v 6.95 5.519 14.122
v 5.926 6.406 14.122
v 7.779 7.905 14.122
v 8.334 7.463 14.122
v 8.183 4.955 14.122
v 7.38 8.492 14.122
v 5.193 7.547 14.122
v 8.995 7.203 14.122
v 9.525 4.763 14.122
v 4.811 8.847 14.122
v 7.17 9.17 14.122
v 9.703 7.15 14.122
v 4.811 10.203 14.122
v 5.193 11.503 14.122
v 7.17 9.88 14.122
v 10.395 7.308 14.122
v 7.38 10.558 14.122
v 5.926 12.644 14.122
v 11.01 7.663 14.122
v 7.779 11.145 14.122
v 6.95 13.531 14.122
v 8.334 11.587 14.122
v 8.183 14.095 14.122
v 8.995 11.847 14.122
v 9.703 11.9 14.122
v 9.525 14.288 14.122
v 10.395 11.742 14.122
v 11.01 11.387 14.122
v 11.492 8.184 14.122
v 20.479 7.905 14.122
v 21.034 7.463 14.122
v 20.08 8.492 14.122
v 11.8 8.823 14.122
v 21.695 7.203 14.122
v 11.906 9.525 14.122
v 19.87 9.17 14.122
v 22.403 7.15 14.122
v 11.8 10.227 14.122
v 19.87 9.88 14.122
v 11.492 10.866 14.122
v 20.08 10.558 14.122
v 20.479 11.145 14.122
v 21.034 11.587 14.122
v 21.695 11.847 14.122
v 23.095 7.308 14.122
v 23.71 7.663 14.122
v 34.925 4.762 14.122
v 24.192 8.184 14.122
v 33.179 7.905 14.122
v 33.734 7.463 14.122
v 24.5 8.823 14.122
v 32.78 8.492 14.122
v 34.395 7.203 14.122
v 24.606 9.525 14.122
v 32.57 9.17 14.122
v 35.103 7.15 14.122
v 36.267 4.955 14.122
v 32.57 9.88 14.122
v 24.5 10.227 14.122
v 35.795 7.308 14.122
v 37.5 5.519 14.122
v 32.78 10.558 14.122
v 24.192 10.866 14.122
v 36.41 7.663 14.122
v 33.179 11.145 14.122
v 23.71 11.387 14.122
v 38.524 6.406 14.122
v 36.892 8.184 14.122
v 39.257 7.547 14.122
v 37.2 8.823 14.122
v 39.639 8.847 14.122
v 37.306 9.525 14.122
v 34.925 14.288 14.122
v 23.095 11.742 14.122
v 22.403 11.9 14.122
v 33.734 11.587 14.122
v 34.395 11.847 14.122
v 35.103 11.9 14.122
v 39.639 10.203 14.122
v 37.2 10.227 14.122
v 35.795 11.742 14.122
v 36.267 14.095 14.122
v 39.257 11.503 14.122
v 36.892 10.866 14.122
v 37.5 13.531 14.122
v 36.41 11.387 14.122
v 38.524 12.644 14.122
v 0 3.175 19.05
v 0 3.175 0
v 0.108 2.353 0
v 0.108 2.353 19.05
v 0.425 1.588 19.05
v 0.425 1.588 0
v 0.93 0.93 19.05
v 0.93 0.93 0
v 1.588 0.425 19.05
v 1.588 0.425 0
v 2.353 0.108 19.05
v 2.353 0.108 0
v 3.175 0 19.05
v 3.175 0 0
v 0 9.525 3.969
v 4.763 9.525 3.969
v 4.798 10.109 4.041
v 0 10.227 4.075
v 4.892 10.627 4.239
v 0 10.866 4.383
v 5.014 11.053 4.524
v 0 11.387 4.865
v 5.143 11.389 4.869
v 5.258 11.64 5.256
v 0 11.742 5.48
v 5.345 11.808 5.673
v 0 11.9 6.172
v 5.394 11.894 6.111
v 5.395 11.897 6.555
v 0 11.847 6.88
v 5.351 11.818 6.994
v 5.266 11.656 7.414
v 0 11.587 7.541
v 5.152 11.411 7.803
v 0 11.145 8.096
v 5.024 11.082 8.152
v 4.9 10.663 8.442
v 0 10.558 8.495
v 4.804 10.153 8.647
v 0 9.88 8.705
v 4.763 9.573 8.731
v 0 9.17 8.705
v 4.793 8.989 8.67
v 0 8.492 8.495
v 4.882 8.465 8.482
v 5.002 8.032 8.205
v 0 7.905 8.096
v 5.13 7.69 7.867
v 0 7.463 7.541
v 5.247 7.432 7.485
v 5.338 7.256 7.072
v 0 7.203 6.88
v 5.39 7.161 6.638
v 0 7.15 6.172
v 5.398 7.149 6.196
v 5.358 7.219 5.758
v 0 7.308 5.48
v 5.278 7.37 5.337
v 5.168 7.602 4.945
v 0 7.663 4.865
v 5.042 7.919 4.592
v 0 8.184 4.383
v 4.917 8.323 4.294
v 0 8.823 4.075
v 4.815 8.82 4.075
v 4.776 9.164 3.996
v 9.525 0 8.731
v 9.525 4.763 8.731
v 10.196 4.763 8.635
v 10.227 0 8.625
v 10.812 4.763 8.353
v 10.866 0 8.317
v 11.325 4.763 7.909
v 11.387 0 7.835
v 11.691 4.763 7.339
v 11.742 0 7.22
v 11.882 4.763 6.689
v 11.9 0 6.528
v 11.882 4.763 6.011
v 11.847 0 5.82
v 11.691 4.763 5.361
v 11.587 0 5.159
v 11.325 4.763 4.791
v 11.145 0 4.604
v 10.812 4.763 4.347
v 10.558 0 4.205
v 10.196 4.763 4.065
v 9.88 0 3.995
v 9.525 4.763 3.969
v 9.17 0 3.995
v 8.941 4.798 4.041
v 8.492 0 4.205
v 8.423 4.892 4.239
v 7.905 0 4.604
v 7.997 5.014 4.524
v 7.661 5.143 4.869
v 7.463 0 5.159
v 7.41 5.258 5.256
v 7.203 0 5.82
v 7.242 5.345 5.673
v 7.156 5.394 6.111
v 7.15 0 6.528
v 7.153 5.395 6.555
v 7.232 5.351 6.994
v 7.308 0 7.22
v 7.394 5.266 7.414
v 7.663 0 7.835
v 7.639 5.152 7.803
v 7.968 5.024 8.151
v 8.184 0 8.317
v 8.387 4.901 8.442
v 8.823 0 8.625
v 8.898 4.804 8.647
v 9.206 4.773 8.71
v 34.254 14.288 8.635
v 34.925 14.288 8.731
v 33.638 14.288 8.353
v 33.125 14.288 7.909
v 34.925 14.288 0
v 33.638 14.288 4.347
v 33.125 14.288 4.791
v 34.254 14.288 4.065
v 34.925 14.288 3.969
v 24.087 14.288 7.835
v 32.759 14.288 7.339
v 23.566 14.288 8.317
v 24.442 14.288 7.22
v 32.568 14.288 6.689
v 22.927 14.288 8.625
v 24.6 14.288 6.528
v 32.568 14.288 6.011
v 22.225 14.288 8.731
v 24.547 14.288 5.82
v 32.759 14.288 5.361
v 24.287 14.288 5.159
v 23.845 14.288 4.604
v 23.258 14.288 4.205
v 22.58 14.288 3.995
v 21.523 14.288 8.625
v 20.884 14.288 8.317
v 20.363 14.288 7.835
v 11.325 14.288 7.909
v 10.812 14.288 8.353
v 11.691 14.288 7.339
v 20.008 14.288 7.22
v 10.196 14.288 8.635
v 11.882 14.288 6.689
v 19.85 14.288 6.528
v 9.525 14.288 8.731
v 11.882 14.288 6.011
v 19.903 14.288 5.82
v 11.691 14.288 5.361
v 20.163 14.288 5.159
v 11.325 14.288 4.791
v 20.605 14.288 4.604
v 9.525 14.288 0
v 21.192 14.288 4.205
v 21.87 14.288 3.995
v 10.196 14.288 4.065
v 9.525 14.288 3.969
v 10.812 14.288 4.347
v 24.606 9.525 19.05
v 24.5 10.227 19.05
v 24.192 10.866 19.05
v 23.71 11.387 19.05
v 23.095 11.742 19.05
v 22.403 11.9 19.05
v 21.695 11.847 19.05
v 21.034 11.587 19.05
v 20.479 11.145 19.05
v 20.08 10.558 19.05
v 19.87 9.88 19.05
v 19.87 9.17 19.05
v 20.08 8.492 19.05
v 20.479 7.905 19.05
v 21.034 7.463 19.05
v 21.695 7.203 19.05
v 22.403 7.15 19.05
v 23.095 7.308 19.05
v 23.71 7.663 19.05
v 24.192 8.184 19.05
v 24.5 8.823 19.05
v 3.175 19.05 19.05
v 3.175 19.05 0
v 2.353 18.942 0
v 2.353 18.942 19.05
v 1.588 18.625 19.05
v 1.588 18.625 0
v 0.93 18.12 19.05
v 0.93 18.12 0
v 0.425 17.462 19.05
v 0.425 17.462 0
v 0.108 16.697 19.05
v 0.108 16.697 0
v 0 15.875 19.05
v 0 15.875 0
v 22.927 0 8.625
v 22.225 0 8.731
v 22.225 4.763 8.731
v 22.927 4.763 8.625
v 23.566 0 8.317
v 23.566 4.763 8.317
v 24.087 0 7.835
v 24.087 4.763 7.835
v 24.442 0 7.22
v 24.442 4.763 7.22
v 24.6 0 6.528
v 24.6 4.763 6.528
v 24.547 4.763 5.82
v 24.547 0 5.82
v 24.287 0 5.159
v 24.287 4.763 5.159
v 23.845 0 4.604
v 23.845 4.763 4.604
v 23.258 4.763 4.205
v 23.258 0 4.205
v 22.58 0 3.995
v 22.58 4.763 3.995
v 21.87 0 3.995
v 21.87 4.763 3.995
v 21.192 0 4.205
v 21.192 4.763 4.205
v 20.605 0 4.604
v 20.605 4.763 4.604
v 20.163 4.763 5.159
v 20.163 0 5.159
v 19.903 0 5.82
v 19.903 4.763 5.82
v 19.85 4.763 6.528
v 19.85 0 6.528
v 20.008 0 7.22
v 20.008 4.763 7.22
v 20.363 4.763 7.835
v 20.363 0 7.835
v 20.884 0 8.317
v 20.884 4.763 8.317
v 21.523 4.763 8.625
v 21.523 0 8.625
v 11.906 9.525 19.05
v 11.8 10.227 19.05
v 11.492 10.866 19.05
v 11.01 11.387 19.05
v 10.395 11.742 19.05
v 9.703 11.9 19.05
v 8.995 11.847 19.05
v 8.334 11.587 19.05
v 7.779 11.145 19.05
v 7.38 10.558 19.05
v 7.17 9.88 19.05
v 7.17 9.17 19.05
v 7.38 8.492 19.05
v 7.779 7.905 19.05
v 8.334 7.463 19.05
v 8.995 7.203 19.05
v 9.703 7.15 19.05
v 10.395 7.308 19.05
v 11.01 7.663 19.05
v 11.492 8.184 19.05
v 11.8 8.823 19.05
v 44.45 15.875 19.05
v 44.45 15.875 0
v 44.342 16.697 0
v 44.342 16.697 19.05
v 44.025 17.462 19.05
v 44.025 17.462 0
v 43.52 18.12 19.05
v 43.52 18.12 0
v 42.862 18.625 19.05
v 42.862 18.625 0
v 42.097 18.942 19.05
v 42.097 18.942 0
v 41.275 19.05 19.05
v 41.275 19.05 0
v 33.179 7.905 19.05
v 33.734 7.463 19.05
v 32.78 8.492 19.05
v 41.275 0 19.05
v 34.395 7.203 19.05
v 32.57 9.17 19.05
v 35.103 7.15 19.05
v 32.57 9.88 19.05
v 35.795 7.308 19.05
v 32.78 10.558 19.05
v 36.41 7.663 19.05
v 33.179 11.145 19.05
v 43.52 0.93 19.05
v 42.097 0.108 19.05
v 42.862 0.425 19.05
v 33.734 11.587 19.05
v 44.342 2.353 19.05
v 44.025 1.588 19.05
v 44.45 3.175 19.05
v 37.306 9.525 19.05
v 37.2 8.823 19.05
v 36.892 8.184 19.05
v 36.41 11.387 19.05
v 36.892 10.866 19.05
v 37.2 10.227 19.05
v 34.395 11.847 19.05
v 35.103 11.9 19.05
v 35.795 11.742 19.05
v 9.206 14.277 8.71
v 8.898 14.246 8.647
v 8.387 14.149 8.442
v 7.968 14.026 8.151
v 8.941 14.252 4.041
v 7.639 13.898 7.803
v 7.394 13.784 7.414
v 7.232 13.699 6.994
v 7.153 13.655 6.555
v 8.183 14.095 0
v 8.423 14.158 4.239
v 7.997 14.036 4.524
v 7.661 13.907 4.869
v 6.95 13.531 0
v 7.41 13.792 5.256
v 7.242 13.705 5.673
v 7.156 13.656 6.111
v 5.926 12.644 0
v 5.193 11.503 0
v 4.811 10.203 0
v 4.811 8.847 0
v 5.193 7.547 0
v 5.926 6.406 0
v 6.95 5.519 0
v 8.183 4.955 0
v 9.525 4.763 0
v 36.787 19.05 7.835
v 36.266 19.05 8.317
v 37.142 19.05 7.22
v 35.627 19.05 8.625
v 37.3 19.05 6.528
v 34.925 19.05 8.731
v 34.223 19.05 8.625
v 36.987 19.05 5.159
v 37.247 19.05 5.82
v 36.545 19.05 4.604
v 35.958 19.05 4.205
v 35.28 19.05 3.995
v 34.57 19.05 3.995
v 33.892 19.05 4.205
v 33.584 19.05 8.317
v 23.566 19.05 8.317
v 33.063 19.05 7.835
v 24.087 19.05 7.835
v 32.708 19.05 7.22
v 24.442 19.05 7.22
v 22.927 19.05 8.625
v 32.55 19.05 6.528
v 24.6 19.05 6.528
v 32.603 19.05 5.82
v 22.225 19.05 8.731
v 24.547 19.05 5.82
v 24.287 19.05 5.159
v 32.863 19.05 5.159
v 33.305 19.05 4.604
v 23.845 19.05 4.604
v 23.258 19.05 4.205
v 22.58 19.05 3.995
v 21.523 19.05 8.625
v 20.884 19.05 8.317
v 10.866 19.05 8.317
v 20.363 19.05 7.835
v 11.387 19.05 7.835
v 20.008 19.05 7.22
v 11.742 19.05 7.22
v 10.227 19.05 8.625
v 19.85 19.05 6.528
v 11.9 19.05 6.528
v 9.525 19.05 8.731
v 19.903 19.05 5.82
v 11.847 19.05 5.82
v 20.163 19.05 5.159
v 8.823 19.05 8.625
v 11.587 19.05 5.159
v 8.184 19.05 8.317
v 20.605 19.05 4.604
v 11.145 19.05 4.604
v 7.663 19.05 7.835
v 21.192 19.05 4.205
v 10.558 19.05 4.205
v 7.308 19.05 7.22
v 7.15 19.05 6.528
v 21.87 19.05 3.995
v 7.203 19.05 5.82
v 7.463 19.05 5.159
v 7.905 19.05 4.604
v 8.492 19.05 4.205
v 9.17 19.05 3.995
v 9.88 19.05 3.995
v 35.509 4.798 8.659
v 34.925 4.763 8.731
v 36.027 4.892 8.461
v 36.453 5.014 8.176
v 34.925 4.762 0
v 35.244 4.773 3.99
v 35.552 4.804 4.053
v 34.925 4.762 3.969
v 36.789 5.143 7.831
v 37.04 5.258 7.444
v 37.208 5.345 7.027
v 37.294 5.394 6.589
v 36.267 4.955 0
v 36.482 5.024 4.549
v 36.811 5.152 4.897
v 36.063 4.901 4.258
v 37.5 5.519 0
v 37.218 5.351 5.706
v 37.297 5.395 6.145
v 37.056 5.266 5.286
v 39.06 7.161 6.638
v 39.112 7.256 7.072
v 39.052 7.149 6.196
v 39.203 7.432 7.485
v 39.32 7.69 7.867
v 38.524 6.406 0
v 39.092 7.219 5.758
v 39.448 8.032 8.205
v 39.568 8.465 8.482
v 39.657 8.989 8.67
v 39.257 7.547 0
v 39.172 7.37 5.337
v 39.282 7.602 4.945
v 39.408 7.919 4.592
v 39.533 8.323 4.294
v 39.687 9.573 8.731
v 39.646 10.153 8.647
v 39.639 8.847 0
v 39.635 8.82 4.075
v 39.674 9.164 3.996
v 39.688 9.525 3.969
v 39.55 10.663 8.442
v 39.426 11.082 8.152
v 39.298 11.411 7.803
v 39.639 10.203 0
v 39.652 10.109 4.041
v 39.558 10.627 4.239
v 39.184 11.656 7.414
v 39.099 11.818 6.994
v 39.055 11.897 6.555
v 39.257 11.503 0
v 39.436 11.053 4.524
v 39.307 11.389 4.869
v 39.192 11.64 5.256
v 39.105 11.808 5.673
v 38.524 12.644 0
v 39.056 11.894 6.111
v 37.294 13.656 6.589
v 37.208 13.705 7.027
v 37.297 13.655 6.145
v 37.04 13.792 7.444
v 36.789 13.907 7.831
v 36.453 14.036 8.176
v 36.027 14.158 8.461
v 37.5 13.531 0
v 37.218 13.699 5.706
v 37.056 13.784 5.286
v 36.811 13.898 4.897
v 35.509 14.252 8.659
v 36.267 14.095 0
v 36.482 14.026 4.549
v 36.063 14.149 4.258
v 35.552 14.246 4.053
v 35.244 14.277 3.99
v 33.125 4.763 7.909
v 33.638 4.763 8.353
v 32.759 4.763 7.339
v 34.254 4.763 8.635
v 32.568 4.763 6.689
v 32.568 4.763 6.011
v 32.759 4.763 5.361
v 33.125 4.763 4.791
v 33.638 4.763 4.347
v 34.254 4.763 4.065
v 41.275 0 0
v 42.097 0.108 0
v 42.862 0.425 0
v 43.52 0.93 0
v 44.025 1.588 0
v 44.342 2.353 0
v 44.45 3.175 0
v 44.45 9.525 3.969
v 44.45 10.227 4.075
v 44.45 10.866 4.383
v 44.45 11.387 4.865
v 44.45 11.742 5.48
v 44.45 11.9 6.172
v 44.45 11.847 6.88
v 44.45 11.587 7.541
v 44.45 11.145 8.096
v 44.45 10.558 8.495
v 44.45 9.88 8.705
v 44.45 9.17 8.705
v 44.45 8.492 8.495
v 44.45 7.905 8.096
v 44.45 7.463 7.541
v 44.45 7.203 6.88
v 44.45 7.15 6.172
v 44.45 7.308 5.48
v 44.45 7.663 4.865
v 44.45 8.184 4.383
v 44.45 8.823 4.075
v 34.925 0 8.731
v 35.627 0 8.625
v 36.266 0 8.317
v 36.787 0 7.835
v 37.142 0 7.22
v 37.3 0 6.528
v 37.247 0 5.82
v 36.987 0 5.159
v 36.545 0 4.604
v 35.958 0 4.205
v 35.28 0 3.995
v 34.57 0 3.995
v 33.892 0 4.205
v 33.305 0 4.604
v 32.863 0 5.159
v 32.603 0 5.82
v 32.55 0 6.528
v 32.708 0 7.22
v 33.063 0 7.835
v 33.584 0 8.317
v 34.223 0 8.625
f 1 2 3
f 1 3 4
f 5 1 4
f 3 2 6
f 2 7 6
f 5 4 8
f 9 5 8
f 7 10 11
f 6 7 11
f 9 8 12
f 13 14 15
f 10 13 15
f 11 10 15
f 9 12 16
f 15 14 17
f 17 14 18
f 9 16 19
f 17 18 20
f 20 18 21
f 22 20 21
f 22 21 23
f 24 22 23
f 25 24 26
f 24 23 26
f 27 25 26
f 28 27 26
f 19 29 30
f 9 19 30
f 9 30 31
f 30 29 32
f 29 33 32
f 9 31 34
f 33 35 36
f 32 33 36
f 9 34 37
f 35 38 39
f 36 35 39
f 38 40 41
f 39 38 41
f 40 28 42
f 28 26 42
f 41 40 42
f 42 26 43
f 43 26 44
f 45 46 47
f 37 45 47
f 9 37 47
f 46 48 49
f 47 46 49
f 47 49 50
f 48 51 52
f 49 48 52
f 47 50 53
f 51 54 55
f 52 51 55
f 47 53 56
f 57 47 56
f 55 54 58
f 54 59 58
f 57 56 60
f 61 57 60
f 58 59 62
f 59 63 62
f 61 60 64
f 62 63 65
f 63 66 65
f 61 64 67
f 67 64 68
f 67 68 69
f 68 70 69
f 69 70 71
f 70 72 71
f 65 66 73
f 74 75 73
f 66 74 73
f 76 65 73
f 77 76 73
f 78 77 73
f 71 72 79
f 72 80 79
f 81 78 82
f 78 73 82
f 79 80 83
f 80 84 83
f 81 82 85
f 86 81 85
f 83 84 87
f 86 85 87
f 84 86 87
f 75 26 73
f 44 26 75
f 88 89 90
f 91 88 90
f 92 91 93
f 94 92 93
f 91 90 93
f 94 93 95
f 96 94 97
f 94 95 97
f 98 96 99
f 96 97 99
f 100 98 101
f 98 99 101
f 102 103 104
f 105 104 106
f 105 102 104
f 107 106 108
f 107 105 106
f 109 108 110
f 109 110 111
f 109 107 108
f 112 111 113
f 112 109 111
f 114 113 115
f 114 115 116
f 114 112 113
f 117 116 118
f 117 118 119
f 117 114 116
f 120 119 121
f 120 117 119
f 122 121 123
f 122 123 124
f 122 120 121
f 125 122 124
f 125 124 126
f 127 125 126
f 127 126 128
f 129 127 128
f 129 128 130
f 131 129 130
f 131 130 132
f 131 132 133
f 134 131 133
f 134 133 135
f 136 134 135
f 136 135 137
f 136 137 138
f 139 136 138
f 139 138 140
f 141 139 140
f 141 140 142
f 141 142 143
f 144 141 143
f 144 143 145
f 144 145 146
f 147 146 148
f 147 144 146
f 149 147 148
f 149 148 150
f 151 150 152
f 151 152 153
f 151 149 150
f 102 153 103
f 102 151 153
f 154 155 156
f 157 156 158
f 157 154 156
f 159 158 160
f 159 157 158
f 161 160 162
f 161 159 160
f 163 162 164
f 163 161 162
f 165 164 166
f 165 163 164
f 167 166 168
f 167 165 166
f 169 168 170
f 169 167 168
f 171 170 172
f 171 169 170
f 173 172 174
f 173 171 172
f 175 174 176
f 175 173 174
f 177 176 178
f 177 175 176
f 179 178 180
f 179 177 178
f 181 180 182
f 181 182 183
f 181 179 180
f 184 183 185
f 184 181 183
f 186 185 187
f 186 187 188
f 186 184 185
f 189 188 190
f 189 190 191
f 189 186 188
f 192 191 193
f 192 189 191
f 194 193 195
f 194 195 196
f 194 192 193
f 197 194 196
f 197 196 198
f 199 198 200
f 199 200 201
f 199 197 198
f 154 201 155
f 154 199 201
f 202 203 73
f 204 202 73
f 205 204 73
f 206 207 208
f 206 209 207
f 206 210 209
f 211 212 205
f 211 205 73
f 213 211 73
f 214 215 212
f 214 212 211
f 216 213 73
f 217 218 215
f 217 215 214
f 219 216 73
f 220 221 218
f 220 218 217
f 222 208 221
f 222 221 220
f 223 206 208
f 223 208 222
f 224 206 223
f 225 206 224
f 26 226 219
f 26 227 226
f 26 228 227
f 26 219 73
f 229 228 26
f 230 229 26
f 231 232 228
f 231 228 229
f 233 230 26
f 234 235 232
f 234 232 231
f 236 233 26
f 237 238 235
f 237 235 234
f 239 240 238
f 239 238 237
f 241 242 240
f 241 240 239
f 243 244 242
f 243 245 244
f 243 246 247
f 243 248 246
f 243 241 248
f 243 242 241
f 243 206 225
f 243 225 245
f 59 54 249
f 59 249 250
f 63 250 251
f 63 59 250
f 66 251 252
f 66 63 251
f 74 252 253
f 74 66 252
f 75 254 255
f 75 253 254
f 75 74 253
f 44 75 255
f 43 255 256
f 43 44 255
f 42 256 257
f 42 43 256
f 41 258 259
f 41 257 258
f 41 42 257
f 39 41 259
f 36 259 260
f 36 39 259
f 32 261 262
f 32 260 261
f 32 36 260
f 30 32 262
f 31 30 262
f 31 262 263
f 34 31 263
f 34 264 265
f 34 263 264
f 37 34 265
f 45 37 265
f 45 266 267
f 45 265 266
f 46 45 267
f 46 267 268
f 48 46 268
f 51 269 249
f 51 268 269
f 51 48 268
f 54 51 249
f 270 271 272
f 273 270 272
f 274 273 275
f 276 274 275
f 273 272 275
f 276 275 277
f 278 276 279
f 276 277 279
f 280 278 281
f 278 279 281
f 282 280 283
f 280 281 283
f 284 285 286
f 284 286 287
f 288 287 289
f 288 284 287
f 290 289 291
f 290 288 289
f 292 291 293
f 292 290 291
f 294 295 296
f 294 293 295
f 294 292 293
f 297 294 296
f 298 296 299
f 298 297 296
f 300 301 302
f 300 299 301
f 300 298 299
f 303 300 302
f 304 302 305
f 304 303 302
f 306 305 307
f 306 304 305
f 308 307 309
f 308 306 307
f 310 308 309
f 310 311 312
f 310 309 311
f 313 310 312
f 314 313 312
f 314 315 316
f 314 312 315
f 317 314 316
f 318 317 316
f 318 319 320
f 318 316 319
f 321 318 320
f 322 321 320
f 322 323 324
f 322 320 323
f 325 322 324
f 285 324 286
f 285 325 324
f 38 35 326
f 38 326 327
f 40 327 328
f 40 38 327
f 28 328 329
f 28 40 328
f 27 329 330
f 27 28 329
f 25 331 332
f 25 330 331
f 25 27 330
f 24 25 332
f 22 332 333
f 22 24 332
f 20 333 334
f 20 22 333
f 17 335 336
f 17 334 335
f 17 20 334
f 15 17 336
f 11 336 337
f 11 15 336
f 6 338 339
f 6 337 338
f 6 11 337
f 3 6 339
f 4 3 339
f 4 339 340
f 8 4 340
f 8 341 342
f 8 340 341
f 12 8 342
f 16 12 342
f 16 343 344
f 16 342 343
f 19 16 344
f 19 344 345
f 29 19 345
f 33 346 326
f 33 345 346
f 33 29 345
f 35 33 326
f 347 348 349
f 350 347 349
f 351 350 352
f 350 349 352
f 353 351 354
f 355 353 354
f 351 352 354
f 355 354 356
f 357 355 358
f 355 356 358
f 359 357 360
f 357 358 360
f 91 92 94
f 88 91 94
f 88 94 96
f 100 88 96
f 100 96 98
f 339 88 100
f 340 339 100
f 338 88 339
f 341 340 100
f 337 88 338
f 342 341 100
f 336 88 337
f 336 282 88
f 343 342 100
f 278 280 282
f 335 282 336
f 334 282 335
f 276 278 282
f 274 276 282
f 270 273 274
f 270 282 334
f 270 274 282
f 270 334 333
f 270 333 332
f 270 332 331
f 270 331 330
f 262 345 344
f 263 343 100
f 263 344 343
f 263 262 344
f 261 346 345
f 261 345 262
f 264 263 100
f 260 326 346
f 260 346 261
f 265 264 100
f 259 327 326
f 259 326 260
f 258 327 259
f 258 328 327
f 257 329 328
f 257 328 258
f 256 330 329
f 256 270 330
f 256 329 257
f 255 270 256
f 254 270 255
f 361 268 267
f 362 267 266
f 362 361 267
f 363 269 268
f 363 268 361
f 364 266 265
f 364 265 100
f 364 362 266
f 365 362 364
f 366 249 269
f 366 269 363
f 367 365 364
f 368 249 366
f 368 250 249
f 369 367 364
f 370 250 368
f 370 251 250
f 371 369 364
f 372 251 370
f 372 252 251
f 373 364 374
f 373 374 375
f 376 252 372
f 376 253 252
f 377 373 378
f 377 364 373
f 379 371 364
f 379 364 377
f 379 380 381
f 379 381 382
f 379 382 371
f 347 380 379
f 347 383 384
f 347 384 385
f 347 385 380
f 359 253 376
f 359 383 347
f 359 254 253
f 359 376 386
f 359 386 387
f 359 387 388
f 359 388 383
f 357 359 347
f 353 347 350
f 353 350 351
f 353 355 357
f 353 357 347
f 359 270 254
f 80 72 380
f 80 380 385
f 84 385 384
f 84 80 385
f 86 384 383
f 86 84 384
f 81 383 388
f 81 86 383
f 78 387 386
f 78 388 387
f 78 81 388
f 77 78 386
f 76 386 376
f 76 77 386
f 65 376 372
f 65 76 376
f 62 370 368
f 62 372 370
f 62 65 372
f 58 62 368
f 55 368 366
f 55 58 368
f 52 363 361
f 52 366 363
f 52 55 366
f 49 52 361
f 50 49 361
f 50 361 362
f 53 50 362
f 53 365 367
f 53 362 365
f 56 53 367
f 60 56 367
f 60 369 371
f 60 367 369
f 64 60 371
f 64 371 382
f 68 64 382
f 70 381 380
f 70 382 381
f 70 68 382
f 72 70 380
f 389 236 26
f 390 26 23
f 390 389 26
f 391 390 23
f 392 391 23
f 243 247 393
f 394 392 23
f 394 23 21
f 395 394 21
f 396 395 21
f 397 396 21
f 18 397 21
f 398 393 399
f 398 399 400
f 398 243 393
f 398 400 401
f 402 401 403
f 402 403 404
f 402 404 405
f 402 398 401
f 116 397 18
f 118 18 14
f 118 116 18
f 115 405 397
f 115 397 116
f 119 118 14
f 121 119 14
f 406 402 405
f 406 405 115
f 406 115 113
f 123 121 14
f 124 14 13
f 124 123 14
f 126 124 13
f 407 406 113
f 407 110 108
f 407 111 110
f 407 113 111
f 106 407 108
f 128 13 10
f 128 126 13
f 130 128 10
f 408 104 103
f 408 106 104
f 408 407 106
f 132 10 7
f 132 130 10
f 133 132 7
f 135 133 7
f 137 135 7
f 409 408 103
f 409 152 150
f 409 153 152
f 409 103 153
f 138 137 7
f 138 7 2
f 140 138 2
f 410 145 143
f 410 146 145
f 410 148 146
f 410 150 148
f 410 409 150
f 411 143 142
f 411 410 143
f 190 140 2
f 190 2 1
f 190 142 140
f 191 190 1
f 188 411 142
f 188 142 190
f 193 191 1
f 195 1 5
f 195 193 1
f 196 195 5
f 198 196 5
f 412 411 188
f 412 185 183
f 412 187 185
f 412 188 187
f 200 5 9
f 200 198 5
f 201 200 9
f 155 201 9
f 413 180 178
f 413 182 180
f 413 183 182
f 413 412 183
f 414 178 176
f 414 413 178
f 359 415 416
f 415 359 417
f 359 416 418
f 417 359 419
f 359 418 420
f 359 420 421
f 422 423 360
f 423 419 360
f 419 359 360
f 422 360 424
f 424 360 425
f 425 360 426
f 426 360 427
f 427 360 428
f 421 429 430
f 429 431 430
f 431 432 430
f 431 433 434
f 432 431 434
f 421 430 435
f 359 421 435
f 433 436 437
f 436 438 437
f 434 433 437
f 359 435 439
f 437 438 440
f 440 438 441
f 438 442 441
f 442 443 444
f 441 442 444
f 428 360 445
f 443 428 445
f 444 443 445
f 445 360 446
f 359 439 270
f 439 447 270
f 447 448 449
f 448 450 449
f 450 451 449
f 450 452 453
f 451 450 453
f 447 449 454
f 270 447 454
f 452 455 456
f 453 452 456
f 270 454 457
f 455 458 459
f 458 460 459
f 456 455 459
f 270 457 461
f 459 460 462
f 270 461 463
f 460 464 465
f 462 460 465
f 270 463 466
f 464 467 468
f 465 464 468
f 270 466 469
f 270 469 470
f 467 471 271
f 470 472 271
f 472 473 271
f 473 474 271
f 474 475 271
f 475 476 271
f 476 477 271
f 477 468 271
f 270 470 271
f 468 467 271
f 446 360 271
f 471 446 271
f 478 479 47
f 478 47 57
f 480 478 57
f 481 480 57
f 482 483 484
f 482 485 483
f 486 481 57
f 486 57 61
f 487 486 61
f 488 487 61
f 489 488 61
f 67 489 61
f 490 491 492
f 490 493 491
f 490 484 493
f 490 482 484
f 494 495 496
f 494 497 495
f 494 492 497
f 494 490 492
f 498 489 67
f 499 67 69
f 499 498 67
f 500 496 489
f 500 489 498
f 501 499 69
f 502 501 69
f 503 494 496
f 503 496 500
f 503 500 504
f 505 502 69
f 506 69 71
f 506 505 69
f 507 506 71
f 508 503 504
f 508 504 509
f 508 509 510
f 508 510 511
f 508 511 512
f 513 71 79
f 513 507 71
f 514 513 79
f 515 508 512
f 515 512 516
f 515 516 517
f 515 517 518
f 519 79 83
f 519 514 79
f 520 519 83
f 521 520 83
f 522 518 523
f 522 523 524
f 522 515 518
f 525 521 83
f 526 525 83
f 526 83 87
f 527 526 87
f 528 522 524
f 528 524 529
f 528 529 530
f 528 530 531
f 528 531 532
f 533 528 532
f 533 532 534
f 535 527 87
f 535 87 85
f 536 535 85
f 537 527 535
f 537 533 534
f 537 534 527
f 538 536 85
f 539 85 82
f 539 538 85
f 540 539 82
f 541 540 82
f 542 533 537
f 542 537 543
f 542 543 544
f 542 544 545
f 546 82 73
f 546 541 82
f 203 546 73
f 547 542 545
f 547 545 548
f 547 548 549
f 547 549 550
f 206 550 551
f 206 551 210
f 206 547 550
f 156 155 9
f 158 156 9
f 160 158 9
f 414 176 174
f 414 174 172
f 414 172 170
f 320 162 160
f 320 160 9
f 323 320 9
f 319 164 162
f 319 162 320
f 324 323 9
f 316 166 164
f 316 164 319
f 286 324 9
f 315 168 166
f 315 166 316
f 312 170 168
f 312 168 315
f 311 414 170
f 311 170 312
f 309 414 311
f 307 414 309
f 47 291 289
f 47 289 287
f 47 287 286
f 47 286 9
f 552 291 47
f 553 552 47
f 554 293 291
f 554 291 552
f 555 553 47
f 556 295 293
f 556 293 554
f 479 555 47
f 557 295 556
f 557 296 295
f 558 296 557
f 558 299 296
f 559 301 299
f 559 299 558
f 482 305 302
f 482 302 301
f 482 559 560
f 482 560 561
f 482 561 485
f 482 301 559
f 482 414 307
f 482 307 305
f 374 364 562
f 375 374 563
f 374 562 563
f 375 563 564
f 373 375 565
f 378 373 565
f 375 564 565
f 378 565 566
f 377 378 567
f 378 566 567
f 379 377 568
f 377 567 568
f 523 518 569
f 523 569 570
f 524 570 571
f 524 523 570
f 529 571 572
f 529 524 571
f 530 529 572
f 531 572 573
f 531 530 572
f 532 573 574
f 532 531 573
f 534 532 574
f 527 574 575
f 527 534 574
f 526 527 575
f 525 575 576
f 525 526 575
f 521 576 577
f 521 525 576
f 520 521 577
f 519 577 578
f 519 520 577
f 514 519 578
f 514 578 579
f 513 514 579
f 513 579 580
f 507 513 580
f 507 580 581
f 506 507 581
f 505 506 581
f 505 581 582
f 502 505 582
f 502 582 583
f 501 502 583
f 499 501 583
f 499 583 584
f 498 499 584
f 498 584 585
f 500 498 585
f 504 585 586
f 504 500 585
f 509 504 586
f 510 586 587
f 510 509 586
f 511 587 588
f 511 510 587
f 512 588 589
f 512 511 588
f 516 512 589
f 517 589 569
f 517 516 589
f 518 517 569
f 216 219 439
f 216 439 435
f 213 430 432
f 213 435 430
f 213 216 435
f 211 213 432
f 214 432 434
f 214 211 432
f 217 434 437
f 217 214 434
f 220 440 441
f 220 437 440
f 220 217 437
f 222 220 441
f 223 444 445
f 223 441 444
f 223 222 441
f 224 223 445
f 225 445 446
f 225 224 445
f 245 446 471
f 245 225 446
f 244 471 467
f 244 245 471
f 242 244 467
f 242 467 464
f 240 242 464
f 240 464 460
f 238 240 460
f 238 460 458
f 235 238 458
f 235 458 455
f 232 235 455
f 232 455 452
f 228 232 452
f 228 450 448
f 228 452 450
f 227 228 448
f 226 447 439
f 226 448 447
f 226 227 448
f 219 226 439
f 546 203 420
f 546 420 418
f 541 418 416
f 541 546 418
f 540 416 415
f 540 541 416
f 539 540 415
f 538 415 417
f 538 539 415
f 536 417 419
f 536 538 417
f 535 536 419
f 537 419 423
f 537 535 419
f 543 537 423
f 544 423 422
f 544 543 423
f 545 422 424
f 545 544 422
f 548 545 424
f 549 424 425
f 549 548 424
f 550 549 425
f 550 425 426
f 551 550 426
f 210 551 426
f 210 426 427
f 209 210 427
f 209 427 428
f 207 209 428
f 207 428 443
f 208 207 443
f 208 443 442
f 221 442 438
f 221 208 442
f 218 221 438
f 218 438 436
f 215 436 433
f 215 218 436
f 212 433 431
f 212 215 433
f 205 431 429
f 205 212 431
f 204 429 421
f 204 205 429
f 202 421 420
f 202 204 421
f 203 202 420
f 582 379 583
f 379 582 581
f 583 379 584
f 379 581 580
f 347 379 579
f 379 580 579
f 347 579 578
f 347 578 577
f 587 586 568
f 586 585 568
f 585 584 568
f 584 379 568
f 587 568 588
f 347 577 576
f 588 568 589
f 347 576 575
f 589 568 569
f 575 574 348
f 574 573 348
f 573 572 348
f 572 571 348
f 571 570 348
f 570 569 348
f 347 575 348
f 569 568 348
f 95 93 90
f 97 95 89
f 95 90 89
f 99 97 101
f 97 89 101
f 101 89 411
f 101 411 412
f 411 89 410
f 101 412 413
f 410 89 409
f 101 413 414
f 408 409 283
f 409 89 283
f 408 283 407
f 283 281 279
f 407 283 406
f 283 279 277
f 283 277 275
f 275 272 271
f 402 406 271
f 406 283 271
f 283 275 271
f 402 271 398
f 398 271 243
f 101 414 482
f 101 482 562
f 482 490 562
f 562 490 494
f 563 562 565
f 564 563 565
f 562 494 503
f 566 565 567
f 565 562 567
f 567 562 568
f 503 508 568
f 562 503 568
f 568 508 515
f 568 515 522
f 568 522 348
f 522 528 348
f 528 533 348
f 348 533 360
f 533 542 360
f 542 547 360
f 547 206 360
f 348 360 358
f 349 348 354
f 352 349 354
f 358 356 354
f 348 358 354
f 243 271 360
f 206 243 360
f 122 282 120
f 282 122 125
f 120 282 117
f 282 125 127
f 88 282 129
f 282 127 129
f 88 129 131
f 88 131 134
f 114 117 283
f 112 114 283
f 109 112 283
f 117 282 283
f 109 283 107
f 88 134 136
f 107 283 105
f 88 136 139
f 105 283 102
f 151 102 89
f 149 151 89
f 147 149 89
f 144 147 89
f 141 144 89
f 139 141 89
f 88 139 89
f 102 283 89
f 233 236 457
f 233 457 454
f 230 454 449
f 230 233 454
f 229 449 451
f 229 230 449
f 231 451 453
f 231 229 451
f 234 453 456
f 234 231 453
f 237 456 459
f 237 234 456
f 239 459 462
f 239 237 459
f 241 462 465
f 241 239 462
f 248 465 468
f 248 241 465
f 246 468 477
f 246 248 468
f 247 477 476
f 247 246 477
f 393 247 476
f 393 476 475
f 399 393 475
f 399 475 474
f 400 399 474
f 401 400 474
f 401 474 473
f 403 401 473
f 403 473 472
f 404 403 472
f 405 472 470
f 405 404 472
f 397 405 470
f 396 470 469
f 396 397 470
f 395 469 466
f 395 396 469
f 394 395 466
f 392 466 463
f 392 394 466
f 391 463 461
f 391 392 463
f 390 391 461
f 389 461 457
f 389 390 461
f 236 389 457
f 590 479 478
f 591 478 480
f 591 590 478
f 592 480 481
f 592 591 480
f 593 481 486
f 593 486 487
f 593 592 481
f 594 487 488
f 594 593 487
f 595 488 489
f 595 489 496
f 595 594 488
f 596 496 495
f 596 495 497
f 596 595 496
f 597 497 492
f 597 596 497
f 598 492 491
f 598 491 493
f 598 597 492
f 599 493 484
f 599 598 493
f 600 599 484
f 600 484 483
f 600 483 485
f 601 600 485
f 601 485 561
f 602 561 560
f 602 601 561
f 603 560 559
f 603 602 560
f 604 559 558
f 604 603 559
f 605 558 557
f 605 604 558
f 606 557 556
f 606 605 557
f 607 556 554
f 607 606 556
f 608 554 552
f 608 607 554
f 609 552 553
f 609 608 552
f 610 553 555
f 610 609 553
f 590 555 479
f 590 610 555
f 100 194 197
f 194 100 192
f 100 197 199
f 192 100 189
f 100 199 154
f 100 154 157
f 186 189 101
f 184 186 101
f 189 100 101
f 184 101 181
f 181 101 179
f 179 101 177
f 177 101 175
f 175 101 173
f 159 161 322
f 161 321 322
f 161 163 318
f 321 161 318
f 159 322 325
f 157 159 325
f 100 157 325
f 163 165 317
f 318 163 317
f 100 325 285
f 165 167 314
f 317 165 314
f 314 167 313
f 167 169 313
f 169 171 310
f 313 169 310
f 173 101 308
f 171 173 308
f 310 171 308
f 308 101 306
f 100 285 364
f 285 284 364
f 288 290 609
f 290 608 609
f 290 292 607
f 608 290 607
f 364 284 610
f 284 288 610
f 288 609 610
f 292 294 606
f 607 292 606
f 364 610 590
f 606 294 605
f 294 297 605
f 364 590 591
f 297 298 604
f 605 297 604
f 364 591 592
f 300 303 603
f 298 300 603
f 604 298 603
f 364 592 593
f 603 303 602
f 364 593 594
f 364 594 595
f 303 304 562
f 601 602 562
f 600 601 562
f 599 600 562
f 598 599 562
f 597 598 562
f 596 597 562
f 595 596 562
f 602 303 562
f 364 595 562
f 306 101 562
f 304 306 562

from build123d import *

# Parameters (mm, degrees)
BOSS_EXTRUDE1_DEPTH     = 19.05
CUT_EXTRUDE1_DEPTH      = 14.1224
CUT_EXTRUDE2_DEPTH      = 52.976990101
CUT_EXTRUDE2_DEPTH_BACK = 52.976990101
SKETCH4_R               = 2.38125
CUT_EXTRUDE3_DEPTH      = 52.976990138
CUT_EXTRUDE3_DEPTH_BACK = 52.976990138
SKETCH5_R               = 2.38125
CUT_EXTRUDE4_DEPTH      = 52.97699026
CUT_EXTRUDE4_DEPTH_BACK = 52.97699026
SKETCH7_R               = 2.38125


with BuildPart() as part:
    # Sketch2 → Boss-Extrude1 (new body)
    with BuildSketch(Plane.XY):
        with BuildLine():
            Line((3.175, 0), (41.275, 0))
            ThreePointArc((41.275, 0), (43.52006403, 0.92993597), (44.45, 3.175))
            Line((44.45, 3.175), (44.45, 15.875))
            ThreePointArc((44.45, 15.875), (43.52006403, 18.12006403), (41.275, 19.05))
            Line((41.275, 19.05), (3.175, 19.05))
            ThreePointArc((3.175, 19.05), (0.92993597, 18.12006403), (0, 15.875))
            Line((0, 15.875), (0, 3.175))
            ThreePointArc((0, 3.175), (0.92993597, 0.92993597), (3.175, 0))
        make_face()
    extrude(amount=BOSS_EXTRUDE1_DEPTH)

    # Sketch3 → Cut-Extrude1 (cut)
    with BuildSketch(Plane(origin=(0, 0, 0), x_dir=(-1, 0, 0), z_dir=(0, 0, -1))):
        with BuildLine():
            Line((-34.925, 14.2875), (-9.525, 14.2875))
            ThreePointArc((-9.525, 14.2875), (-4.7625, 9.525), (-9.525, 4.7625))
            Line((-9.525, 4.7625), (-34.925, 4.7625))
            ThreePointArc((-34.925, 4.7625), (-39.6875, 9.525), (-34.925, 14.2875))
        make_face()
    extrude(amount=-CUT_EXTRUDE1_DEPTH, mode=Mode.SUBTRACT)

    # Sketch4 → Cut-Extrude2 (cut, two sides: drawn at the far end of the back side and taken through both)
    with BuildSketch(Plane(origin=(0, 19.05, 0), x_dir=(1, 0, 0), z_dir=(0, 1, 0)).offset(-CUT_EXTRUDE2_DEPTH_BACK)):
        with Locations(Location((34.925, -6.35, 0), (0, 0, 270))):
            Circle(SKETCH4_R)
        with Locations(Location((22.225, -6.35, 0), (0, 0, 270))):
            Circle(SKETCH4_R)
        with Locations(Location((9.525, -6.35, 0), (0, 0, 270))):
            Circle(SKETCH4_R)
    extrude(amount=CUT_EXTRUDE2_DEPTH + CUT_EXTRUDE2_DEPTH_BACK, mode=Mode.SUBTRACT)

    # Sketch5 → Cut-Extrude3 (cut, two sides: drawn at the far end of the back side and taken through both)
    with BuildSketch(Plane(origin=(44.45, 0, 0), x_dir=(0, 0, -1), z_dir=(1, 0, 0)).offset(-CUT_EXTRUDE3_DEPTH_BACK)):
        with Locations((-6.35, 9.525)):
            Circle(SKETCH5_R)
    extrude(amount=CUT_EXTRUDE3_DEPTH + CUT_EXTRUDE3_DEPTH_BACK, mode=Mode.SUBTRACT)

    # Sketch7 → Cut-Extrude4 (cut, two sides: drawn at the far end of the back side and taken through both)
    with BuildSketch(Plane.XY.offset(19.05).offset(-CUT_EXTRUDE4_DEPTH_BACK)):
        with Locations((22.225, 9.525)):
            Circle(SKETCH7_R)
        with Locations((34.925, 9.525)):
            Circle(SKETCH7_R)
        with Locations((9.525, 9.525)):
            Circle(SKETCH7_R)
    extrude(amount=CUT_EXTRUDE4_DEPTH + CUT_EXTRUDE4_DEPTH_BACK, mode=Mode.SUBTRACT)


solid = part.part
